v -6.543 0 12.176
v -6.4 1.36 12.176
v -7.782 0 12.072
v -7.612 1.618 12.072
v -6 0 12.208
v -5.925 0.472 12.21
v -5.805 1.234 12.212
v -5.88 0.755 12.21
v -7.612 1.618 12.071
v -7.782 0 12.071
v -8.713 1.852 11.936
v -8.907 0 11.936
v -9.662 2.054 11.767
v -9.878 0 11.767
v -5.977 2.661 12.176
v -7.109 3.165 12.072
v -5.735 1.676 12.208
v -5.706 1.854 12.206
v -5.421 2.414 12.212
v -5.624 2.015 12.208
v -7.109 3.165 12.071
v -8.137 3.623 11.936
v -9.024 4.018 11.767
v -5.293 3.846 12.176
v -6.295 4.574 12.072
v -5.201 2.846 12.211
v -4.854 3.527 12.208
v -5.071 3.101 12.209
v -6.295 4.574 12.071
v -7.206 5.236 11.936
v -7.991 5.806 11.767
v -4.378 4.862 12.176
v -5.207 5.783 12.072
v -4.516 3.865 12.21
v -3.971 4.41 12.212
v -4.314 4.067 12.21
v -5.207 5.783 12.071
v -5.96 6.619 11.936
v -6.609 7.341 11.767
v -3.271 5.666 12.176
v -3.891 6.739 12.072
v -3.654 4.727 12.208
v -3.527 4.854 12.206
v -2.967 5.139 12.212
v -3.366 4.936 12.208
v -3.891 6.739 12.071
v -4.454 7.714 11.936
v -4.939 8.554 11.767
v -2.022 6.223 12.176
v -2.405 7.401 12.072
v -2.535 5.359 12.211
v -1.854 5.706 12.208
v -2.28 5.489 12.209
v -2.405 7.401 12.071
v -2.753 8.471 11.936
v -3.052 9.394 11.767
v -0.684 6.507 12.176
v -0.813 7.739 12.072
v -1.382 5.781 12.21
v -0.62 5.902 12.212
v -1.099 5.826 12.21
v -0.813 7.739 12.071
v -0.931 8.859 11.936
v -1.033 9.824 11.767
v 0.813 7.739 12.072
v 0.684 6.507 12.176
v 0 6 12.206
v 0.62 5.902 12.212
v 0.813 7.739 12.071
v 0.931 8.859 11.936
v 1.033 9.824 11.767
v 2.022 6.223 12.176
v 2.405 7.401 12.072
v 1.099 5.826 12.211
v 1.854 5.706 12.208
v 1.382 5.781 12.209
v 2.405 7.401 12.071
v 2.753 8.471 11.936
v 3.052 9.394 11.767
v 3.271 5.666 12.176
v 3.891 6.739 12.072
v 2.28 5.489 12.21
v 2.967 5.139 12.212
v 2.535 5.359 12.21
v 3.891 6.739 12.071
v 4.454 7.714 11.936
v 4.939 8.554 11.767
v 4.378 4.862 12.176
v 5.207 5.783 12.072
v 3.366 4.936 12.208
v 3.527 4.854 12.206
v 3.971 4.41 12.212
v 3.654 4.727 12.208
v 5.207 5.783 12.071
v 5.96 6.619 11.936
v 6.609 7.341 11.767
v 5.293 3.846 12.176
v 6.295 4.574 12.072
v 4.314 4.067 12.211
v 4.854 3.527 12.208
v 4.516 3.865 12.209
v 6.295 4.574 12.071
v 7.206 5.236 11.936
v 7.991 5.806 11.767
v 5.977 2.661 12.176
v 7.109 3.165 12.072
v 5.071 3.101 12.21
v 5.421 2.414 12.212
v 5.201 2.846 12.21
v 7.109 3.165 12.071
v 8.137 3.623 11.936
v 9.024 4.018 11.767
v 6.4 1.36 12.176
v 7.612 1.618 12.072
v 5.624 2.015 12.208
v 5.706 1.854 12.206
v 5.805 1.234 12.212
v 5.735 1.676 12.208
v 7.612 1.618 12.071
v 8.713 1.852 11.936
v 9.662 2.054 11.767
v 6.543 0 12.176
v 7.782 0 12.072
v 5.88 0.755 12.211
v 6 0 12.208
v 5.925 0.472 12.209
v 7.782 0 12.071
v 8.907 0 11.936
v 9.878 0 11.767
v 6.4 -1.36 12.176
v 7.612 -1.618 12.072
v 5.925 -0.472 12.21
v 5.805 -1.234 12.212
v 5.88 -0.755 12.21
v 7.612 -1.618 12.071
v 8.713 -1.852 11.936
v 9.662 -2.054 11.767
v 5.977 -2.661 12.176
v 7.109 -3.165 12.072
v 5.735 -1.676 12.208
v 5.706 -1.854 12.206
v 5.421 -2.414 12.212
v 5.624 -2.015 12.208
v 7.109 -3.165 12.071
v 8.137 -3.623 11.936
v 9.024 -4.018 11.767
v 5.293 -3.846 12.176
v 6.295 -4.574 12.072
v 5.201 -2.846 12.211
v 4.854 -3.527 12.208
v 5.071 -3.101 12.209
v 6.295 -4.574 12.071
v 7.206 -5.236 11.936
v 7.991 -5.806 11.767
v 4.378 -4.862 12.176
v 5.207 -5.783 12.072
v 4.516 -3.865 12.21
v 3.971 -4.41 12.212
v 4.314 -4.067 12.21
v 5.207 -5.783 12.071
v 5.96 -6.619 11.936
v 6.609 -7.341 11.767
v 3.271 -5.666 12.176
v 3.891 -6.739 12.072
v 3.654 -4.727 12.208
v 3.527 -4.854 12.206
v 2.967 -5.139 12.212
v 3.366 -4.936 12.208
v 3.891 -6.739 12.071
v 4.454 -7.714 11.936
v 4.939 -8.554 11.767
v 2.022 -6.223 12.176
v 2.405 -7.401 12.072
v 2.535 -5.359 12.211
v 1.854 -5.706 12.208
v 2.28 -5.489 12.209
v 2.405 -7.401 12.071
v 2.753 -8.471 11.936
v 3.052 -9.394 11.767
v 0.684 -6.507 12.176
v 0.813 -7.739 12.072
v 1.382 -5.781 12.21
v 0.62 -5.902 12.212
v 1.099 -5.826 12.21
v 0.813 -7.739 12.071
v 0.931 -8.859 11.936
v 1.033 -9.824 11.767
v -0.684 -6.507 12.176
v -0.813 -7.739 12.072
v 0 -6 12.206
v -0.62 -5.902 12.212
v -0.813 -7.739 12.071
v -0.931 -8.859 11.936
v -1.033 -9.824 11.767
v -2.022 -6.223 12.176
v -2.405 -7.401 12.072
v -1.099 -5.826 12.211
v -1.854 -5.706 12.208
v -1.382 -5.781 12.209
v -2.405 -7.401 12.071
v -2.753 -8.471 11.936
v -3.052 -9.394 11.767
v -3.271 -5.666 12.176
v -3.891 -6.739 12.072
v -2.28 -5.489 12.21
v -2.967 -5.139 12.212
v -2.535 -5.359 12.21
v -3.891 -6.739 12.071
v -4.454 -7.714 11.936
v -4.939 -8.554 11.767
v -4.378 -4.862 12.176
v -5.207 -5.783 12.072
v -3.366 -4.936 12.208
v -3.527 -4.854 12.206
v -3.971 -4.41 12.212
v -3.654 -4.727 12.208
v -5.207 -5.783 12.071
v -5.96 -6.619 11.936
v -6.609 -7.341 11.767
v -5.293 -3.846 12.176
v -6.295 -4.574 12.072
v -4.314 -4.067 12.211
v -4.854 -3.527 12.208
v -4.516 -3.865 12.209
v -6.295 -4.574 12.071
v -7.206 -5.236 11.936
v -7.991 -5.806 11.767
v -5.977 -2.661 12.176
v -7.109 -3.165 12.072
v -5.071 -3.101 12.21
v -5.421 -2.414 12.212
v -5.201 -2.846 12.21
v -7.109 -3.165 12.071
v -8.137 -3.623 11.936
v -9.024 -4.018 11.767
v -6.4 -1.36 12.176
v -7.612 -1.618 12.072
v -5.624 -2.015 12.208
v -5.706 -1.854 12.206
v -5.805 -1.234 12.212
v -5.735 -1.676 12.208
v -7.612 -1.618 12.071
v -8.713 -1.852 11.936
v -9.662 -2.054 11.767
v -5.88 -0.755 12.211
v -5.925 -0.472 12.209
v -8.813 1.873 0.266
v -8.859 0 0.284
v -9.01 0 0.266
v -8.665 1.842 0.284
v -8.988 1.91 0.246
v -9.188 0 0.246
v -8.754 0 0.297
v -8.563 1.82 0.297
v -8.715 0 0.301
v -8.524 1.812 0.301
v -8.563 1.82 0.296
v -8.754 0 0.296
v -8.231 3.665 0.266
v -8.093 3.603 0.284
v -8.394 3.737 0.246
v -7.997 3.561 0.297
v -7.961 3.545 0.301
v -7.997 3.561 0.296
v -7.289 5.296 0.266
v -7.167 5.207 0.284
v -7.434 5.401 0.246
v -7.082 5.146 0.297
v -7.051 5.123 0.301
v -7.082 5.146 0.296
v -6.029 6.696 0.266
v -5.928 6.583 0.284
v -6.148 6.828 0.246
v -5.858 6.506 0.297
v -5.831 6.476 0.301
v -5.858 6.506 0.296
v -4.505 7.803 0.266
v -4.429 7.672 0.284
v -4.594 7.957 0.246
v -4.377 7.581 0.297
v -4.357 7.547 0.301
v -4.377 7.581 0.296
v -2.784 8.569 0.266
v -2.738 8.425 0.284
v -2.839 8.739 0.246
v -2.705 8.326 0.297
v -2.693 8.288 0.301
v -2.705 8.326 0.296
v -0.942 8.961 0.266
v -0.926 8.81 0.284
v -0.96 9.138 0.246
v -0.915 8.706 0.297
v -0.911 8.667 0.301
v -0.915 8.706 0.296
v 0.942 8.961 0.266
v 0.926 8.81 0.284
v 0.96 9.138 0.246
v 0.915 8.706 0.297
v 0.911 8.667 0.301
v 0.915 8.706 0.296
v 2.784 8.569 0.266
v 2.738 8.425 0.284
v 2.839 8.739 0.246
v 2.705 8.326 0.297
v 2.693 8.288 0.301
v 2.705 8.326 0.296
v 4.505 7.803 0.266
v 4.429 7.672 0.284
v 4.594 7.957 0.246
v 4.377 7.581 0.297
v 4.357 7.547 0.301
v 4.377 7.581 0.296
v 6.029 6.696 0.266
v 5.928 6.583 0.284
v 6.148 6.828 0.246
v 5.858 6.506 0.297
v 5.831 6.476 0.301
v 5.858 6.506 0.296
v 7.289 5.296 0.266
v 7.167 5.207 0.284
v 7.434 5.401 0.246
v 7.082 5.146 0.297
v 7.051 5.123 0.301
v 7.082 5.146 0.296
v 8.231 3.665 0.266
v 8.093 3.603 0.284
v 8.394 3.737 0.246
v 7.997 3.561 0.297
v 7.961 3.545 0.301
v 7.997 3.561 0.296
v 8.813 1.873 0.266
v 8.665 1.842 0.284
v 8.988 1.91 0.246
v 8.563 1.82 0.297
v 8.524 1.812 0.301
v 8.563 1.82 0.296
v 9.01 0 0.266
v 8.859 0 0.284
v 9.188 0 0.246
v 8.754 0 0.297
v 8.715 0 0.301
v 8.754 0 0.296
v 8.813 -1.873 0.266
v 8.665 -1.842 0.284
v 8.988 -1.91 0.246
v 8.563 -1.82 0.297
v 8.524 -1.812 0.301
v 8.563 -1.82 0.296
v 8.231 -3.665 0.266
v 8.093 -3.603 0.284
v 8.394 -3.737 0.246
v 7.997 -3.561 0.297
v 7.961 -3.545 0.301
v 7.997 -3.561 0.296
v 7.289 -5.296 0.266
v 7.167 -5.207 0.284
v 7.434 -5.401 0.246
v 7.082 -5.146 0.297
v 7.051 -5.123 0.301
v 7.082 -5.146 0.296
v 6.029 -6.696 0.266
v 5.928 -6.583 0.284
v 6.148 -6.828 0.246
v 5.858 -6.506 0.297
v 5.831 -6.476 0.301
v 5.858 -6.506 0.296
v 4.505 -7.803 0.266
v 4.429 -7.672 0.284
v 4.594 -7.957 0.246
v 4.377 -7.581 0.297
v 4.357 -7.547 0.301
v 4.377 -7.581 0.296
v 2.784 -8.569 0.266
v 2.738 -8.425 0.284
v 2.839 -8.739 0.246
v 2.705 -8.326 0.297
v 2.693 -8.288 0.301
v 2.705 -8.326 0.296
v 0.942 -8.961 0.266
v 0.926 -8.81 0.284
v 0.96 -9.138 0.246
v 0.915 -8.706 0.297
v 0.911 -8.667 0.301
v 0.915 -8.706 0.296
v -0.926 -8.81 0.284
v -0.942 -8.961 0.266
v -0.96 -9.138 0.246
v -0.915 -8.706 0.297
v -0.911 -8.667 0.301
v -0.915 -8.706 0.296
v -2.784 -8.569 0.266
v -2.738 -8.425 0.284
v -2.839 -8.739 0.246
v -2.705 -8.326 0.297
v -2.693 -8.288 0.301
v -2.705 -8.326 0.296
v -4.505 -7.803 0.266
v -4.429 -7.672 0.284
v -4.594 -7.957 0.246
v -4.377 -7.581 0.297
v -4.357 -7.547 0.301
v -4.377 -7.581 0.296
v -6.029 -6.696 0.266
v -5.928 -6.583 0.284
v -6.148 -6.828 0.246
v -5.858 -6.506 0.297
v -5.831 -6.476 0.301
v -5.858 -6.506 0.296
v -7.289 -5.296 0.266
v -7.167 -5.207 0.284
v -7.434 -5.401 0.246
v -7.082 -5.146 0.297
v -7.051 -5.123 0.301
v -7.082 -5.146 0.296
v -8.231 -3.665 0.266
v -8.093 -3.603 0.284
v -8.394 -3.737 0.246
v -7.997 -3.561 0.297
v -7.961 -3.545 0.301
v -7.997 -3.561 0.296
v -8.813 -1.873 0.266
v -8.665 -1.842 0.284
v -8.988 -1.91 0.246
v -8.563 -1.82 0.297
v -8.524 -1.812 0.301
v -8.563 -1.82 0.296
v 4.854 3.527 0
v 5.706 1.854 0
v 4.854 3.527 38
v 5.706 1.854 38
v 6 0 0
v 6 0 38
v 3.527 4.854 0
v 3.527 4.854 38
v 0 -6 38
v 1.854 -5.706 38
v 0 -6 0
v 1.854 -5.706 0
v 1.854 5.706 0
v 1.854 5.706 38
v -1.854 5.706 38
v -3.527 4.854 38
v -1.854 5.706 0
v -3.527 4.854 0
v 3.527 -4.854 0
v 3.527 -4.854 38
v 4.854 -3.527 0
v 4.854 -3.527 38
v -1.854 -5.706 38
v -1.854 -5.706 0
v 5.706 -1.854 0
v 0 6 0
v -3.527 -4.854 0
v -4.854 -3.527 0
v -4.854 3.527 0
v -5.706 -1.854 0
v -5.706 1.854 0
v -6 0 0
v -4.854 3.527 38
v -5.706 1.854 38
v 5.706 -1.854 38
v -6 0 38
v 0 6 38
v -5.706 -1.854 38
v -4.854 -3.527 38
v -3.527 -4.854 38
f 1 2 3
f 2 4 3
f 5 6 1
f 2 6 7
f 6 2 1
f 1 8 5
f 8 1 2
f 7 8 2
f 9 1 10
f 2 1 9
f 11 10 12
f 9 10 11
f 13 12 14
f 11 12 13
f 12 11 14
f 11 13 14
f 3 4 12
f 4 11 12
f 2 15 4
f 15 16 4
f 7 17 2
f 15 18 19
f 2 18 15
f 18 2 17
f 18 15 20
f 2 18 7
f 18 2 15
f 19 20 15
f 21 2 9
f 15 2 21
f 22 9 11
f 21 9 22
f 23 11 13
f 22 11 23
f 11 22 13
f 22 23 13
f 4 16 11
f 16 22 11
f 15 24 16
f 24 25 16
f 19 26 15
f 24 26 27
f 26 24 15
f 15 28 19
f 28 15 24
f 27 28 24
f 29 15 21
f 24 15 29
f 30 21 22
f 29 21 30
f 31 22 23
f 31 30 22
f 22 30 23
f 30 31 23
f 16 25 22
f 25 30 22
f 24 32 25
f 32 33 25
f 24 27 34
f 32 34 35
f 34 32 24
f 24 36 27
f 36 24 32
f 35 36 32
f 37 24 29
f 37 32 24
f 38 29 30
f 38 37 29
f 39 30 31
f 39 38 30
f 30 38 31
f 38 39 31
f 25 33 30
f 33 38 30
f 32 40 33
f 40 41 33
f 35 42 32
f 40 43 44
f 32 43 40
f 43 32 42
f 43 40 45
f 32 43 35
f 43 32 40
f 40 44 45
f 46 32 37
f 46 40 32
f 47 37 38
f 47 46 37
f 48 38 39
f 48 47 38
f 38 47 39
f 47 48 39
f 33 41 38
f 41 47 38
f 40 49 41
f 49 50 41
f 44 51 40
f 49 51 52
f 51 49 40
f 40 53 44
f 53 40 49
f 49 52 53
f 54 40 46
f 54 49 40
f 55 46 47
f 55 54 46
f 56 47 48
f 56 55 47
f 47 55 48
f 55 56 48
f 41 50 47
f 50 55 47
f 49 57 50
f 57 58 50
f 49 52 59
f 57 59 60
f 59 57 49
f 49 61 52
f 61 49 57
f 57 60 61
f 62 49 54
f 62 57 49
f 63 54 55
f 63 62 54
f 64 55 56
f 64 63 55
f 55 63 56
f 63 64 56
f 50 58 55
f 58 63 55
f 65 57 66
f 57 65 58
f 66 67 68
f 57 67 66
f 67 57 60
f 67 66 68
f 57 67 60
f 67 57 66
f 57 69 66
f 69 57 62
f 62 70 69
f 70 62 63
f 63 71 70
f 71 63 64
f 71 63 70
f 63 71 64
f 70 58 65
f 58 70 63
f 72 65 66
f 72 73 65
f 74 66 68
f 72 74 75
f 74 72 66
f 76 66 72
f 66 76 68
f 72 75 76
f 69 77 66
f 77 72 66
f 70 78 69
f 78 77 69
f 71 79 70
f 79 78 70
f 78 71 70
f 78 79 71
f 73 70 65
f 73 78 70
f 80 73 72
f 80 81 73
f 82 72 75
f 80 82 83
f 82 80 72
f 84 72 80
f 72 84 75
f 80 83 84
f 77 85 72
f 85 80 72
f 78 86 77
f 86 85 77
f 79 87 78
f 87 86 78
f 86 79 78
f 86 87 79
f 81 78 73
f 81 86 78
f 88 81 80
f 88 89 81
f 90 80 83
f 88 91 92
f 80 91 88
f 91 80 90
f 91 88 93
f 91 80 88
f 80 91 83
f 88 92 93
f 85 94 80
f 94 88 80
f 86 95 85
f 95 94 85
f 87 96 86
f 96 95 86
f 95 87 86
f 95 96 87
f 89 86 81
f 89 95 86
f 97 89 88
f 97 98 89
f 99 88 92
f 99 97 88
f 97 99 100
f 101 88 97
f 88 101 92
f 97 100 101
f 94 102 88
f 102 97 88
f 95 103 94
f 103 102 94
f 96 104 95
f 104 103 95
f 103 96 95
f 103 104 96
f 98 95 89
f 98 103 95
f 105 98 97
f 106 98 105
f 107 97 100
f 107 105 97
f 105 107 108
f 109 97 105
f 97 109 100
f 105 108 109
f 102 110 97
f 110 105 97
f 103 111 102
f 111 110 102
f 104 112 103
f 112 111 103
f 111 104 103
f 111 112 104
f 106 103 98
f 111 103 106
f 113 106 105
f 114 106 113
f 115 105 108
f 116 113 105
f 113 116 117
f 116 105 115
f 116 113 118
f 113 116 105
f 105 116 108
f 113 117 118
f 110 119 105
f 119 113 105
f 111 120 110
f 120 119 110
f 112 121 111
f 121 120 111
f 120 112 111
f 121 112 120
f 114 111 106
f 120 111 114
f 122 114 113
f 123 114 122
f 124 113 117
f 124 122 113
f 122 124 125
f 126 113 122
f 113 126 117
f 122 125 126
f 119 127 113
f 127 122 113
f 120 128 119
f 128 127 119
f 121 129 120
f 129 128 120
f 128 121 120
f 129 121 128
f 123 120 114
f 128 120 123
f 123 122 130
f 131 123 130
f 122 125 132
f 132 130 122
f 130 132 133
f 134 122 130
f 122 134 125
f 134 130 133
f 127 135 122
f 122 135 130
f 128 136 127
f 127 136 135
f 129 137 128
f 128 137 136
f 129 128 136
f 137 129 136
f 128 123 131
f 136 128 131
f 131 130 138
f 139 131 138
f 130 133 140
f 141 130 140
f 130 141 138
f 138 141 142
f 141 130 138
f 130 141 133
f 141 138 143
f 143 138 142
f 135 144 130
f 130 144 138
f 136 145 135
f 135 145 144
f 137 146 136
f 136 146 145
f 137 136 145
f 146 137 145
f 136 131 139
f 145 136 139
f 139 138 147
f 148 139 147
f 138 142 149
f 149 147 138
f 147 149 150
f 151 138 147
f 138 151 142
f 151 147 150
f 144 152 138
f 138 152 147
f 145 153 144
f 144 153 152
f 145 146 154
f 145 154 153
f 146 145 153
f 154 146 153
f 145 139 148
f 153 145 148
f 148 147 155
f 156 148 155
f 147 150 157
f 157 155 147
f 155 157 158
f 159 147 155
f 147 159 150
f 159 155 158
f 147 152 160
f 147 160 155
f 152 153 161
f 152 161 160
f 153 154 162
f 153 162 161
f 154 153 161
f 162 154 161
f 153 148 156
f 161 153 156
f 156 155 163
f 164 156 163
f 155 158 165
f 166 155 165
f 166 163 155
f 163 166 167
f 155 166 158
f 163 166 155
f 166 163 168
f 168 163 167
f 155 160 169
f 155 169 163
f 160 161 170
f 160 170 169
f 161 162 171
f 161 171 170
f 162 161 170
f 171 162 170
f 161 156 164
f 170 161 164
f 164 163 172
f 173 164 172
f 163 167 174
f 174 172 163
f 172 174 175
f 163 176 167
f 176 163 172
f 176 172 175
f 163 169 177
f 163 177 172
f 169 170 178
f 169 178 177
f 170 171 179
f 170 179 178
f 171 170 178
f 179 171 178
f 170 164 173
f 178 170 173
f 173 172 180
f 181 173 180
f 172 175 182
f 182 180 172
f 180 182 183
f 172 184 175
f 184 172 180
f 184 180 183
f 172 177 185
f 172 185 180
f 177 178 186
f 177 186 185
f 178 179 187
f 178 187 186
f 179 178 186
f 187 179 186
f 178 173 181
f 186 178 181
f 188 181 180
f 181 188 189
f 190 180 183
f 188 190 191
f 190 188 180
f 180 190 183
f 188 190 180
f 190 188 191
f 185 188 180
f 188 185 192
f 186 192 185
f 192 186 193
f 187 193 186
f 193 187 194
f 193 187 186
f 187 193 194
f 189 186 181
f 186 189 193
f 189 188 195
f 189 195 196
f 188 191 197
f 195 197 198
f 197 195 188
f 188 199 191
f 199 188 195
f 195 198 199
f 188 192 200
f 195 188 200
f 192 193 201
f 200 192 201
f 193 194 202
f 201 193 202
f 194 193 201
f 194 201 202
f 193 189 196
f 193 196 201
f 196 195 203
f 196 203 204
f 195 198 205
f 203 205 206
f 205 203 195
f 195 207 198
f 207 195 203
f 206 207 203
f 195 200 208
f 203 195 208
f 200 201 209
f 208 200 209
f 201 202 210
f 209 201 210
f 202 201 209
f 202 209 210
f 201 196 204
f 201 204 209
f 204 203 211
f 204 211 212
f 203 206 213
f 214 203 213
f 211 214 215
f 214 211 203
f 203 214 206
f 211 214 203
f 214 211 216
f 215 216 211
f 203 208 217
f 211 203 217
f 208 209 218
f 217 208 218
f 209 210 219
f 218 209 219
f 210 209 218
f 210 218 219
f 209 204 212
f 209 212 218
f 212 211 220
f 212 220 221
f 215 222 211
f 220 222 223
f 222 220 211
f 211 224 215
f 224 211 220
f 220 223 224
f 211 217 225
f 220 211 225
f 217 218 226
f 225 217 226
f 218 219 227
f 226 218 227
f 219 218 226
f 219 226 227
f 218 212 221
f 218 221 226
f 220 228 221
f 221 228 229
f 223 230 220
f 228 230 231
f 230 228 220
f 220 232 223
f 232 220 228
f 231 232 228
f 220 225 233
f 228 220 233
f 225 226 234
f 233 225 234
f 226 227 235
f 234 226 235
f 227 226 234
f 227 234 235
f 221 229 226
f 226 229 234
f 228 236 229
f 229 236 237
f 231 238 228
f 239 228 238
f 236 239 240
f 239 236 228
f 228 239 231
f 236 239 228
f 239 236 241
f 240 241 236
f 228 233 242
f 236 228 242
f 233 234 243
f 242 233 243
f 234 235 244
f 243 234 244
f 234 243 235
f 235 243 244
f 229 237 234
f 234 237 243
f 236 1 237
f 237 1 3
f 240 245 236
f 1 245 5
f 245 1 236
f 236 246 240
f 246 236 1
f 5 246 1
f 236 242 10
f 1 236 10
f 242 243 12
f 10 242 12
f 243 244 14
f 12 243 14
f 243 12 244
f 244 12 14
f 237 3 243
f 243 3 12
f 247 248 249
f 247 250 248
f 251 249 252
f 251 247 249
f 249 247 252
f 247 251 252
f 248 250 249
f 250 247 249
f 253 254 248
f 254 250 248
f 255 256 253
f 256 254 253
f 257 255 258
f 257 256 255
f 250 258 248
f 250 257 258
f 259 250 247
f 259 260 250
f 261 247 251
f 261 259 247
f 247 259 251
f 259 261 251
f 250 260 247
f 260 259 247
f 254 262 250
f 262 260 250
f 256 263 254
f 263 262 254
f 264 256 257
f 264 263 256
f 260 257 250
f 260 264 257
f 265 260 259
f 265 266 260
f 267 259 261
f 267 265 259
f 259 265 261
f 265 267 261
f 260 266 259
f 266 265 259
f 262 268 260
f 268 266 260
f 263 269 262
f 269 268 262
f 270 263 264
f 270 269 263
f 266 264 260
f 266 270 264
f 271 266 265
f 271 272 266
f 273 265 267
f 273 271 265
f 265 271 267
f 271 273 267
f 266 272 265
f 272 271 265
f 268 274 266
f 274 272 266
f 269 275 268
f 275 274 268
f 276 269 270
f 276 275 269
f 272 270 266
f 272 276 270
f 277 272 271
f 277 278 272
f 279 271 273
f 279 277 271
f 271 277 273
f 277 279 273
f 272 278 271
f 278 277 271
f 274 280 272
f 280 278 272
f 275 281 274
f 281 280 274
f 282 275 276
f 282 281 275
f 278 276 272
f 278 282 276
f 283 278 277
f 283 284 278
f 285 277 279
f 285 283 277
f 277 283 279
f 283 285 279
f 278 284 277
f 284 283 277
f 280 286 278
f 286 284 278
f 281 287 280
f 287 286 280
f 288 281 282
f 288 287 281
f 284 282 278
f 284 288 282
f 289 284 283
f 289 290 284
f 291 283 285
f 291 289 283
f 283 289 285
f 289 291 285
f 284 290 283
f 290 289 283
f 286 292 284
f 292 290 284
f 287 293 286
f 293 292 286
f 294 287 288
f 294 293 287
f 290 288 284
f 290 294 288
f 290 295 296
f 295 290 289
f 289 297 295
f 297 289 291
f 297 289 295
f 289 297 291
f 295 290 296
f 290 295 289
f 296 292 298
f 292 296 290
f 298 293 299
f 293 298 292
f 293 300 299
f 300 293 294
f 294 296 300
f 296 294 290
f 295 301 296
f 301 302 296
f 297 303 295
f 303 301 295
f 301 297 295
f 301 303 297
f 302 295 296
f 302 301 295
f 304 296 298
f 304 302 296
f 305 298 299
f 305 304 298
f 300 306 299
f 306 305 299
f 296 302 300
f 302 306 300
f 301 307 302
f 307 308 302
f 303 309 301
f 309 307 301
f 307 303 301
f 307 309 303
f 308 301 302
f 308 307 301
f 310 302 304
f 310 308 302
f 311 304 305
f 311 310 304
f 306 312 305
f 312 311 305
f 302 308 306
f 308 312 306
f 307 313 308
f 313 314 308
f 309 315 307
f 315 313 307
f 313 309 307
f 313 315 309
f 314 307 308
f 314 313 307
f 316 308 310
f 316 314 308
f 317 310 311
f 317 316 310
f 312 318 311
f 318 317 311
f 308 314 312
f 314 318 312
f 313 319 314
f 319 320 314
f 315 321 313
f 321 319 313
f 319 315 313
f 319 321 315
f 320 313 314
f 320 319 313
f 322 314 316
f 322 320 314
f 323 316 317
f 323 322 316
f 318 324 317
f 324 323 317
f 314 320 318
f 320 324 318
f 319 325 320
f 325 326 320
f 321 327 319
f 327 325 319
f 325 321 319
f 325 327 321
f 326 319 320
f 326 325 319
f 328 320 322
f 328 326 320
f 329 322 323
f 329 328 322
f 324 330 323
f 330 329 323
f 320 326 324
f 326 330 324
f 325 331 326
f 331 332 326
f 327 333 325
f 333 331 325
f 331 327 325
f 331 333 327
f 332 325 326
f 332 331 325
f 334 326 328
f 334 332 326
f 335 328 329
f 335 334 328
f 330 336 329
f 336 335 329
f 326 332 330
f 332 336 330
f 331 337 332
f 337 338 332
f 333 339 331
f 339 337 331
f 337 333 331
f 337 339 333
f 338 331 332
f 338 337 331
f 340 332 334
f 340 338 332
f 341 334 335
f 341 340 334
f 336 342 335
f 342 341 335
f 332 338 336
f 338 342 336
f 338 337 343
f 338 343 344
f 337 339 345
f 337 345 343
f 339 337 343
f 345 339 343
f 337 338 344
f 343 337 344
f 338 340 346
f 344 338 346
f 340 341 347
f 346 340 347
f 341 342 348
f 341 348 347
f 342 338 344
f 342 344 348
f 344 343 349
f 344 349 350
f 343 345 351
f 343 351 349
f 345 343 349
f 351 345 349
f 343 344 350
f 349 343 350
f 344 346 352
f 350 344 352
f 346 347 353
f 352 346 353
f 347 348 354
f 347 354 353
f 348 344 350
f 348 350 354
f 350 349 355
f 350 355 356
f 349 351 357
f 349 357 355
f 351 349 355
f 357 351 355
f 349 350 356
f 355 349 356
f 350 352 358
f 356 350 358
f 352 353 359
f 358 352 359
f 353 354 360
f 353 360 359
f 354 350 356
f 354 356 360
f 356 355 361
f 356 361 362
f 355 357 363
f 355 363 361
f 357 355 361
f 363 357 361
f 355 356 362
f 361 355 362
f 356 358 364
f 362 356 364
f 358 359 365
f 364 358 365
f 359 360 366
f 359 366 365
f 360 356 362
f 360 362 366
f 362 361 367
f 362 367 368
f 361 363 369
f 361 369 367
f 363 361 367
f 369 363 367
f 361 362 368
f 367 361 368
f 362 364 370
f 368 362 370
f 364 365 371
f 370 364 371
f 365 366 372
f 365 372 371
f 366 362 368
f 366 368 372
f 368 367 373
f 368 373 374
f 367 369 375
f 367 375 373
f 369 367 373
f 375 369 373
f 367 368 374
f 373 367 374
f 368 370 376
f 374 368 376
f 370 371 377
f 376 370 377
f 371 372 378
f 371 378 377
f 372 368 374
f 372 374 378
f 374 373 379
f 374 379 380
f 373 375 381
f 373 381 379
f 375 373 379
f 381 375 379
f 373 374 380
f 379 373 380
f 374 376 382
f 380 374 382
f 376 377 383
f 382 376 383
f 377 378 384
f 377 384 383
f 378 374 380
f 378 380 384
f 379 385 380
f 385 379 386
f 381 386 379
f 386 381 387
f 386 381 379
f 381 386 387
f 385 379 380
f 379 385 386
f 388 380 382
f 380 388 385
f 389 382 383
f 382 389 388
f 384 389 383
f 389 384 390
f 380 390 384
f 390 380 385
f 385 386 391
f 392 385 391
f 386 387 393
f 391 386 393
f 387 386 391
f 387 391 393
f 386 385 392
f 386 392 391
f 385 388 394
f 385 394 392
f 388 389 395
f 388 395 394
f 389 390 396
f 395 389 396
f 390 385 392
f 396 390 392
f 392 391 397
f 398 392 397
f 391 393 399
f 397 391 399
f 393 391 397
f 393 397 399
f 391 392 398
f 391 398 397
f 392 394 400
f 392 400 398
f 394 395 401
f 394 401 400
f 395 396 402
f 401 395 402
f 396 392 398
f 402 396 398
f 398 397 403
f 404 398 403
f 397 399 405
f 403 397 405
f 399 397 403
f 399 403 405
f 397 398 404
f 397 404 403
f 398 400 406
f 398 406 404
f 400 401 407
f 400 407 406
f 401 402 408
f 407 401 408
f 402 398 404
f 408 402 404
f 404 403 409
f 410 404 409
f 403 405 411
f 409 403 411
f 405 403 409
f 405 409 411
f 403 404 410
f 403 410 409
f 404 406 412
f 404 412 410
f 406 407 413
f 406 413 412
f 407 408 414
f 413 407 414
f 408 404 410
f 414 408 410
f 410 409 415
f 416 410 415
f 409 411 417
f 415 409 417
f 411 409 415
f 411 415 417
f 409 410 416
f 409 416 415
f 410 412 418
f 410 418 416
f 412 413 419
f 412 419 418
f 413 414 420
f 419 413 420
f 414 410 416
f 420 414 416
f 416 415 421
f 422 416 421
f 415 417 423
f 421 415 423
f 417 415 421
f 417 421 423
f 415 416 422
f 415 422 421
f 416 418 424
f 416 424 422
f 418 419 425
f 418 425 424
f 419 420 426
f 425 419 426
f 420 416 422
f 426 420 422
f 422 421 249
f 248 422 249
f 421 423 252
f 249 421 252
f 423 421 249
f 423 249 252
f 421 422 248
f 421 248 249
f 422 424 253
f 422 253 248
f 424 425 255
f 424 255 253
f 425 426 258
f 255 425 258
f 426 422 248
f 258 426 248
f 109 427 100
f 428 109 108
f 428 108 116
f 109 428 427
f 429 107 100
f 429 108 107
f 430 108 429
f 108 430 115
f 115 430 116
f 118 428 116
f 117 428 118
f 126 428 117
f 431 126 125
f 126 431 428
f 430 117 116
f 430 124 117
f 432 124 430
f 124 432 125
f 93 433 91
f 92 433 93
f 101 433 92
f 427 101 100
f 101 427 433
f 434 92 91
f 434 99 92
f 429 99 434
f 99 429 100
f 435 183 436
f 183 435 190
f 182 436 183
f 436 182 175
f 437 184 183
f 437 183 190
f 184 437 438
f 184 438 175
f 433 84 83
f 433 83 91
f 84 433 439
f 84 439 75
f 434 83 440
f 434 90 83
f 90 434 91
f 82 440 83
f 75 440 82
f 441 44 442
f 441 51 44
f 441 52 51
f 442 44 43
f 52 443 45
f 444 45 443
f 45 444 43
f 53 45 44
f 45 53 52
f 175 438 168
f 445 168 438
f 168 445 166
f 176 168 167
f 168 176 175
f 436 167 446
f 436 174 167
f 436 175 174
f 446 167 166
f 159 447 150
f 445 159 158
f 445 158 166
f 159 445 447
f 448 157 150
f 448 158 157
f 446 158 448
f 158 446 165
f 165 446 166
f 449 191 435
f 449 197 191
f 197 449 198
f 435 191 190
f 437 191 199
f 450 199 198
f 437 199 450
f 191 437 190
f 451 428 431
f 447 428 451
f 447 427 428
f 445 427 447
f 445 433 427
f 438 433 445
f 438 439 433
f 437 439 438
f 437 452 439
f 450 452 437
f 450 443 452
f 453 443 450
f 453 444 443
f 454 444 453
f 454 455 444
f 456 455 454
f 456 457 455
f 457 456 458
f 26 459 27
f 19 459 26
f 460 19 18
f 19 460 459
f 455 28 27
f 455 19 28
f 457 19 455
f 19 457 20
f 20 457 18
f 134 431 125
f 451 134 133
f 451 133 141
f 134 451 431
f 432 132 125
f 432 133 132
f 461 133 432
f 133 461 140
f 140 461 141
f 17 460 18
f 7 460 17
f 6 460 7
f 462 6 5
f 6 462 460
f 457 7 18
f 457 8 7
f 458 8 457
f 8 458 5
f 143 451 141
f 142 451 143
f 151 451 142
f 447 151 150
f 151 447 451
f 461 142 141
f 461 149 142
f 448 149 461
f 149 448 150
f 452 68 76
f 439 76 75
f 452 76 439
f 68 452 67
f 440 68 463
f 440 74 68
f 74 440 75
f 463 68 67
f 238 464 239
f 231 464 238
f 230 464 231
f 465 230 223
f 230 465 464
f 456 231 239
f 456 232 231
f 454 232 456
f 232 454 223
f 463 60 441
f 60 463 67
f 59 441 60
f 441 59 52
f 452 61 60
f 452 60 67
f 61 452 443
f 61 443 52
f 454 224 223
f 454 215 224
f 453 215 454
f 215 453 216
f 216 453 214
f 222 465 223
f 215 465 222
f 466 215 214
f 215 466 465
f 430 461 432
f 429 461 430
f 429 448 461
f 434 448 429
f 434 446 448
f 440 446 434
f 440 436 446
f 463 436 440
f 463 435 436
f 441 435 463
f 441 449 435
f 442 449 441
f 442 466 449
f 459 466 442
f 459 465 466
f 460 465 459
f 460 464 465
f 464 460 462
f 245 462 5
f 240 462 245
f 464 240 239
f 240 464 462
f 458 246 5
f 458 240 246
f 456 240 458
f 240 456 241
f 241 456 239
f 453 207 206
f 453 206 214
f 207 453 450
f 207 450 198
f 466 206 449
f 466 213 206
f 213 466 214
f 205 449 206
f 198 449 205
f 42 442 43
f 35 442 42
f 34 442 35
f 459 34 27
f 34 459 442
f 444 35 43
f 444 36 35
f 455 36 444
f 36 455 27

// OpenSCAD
union() {
  scale(0.1)
  rotate_extrude()
    import("halftower.dxf");
  cylinder(r=6,h=38, $fn=20);
}
